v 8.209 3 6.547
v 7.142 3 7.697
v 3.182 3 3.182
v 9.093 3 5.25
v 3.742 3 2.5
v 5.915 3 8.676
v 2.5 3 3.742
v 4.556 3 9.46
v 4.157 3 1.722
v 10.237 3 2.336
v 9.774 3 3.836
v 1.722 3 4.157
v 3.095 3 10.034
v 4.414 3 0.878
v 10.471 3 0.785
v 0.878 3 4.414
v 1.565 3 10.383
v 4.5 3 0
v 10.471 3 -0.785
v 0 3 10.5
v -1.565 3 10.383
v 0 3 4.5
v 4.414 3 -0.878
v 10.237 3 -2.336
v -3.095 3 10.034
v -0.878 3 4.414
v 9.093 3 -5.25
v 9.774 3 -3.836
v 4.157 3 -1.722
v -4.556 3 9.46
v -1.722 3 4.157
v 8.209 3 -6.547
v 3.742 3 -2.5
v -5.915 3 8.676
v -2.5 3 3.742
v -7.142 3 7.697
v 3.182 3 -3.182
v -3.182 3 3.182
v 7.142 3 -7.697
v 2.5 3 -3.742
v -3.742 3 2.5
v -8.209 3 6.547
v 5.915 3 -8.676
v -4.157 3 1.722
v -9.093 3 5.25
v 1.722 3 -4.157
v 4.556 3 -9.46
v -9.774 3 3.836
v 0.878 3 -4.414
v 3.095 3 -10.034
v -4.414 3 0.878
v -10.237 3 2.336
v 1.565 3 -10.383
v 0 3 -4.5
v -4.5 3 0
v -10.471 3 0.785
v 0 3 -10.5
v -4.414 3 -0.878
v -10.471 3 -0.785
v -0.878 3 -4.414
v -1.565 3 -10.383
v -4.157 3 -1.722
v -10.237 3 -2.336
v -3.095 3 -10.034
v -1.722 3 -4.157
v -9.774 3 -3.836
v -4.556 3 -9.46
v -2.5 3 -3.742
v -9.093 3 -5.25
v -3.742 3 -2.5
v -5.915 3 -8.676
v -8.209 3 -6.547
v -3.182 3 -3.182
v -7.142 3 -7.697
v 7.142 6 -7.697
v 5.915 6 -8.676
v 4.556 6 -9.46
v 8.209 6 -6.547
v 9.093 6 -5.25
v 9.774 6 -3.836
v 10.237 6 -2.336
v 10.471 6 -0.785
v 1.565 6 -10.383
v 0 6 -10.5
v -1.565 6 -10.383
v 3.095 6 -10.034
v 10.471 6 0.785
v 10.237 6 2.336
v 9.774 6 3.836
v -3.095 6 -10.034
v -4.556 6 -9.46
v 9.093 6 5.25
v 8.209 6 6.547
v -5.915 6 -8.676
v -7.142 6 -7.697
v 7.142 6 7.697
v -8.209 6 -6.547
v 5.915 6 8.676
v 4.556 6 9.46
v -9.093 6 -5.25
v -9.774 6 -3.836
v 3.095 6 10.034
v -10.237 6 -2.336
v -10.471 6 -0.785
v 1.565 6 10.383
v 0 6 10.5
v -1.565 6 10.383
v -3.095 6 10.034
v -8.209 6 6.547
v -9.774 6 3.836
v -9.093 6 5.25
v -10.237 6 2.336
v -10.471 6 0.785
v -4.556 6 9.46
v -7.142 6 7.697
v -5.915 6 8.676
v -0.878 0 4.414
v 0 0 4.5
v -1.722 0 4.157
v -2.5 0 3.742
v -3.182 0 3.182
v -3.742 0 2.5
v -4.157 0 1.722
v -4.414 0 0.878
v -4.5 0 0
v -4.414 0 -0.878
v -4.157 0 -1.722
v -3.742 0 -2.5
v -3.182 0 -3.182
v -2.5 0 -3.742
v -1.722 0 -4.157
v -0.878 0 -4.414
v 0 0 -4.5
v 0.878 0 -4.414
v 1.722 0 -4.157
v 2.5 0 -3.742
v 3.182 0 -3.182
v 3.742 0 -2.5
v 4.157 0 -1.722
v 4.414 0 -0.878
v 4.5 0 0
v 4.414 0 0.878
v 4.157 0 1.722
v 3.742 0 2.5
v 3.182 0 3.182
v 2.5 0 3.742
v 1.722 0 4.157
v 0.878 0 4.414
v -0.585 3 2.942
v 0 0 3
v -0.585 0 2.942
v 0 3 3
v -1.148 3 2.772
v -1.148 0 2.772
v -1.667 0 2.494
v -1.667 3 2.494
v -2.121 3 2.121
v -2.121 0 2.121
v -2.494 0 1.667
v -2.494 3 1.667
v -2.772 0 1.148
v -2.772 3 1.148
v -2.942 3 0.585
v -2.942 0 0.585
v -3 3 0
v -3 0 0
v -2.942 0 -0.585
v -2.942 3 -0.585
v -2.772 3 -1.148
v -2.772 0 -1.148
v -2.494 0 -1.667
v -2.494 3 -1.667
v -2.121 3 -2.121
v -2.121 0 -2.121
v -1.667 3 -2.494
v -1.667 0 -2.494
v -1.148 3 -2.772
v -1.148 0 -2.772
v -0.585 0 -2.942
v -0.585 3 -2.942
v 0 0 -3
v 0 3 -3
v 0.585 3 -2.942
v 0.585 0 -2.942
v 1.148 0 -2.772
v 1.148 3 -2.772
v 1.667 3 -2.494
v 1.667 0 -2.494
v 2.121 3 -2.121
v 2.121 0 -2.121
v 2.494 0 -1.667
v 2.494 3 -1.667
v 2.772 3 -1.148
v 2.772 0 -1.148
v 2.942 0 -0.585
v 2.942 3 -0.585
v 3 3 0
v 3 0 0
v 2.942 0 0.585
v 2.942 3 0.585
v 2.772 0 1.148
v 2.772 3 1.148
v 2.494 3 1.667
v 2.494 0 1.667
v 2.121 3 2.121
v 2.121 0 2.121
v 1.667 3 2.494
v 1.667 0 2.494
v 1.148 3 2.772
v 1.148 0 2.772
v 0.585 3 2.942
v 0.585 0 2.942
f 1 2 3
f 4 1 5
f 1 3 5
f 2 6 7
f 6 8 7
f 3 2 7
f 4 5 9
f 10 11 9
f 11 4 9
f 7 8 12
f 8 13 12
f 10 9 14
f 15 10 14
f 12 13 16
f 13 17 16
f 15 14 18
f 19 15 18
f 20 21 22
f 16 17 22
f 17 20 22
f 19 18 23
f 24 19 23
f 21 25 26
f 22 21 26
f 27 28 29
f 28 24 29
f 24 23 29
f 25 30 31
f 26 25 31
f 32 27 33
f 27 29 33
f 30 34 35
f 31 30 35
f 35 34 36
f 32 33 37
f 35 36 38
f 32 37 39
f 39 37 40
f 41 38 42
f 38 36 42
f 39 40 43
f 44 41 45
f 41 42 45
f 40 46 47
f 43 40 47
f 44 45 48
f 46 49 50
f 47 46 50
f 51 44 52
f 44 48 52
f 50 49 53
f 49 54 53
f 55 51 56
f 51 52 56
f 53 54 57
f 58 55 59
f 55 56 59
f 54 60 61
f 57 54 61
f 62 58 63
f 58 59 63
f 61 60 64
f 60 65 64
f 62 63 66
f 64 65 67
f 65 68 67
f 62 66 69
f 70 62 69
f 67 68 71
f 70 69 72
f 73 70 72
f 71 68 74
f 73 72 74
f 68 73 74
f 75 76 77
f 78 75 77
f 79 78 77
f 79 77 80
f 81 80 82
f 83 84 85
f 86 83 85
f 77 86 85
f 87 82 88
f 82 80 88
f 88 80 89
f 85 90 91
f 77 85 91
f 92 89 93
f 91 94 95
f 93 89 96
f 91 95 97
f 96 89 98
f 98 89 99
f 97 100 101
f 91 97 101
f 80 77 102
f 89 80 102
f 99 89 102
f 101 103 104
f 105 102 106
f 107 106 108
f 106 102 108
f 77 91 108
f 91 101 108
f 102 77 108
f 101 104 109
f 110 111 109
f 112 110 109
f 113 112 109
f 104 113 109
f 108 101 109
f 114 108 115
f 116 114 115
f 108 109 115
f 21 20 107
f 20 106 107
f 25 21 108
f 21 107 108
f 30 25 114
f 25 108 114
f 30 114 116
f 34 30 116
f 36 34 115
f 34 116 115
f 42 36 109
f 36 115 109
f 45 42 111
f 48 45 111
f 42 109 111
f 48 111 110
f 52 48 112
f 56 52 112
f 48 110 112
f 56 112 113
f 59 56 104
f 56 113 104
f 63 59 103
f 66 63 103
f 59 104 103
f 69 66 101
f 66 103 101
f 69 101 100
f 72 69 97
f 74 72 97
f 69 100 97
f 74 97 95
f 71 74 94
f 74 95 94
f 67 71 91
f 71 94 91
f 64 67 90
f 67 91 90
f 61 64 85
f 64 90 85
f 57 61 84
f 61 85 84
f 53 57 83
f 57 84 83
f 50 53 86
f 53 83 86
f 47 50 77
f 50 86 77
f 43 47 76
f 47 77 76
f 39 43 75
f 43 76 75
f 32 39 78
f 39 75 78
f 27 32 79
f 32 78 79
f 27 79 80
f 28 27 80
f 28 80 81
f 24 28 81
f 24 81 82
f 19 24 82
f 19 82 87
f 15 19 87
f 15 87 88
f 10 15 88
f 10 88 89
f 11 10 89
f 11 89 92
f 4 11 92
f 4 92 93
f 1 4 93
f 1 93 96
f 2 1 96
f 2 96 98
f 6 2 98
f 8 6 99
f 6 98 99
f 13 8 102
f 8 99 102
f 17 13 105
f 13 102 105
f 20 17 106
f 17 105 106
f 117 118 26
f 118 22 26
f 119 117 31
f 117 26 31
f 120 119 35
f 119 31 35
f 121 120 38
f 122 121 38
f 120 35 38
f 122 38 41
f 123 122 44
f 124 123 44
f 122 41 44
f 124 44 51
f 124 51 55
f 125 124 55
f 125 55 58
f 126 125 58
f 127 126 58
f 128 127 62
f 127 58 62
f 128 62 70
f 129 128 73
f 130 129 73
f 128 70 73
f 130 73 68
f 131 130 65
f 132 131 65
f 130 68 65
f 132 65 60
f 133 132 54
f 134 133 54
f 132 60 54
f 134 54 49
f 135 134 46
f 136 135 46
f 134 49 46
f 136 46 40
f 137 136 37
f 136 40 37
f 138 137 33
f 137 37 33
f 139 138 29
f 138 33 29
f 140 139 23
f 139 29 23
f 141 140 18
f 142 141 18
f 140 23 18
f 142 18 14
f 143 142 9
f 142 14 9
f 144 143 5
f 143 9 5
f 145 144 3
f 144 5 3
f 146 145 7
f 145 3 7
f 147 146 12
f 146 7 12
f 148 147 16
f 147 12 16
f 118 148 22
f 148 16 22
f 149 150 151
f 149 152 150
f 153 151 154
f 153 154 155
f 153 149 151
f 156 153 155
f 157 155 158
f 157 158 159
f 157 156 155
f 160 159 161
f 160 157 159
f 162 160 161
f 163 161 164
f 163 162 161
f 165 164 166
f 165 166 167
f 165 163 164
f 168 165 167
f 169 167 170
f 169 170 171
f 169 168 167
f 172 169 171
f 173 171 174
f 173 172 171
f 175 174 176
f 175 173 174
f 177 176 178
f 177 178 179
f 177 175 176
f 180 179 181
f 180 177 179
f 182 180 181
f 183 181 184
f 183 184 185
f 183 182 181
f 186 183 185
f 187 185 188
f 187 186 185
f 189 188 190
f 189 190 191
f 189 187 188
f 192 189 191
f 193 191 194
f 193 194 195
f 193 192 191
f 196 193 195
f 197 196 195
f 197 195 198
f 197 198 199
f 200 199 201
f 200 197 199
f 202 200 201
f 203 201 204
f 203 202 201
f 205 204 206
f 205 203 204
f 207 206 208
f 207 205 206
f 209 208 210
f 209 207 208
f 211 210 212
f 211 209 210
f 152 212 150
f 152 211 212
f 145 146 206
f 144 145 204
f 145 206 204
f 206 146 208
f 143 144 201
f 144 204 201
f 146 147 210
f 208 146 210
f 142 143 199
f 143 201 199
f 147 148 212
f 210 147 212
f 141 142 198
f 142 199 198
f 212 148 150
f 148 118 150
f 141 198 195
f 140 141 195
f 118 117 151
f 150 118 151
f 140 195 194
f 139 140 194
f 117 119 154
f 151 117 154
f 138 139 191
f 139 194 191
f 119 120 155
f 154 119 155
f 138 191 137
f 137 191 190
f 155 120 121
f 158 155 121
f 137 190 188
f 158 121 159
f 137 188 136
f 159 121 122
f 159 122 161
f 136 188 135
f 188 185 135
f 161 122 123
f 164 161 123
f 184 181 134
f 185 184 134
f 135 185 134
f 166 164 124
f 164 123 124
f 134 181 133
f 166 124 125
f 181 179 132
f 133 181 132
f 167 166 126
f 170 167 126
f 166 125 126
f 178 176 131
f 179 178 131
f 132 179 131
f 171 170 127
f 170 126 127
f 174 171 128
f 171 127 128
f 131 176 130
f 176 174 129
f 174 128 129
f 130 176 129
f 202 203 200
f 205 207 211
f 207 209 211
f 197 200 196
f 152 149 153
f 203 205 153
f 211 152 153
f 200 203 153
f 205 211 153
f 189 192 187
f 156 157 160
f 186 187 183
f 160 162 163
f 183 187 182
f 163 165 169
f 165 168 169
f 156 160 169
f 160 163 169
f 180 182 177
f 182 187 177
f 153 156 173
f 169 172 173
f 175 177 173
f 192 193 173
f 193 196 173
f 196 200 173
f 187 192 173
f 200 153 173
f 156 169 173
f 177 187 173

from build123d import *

# Parameters (mm, degrees)
SKETCH1_W = 1.5
SKETCH1_H = 3


with BuildPart() as part:
    # Sketch1 → Revolve1 (revolve)
    with BuildSketch(Plane(origin=(0, 0, 0), x_dir=(0, 0, -1), z_dir=(1, 0, 0)), mode=Mode.PRIVATE) as revolve1_sk:
        Polygon((10.5, 6), (0, 6), (0, 3), (3, 3), (4.5, 3), (10.5, 3), align=None)
        with Locations((3.75, 1.5)):
            Rectangle(SKETCH1_W, SKETCH1_H)
    revolve(revolve1_sk.sketch.rotate(Axis((0, 0, 0), (0, -1, 0)), 180), axis=Axis((0, 0, 0), (0, -1, 0)))


solid = part.part
